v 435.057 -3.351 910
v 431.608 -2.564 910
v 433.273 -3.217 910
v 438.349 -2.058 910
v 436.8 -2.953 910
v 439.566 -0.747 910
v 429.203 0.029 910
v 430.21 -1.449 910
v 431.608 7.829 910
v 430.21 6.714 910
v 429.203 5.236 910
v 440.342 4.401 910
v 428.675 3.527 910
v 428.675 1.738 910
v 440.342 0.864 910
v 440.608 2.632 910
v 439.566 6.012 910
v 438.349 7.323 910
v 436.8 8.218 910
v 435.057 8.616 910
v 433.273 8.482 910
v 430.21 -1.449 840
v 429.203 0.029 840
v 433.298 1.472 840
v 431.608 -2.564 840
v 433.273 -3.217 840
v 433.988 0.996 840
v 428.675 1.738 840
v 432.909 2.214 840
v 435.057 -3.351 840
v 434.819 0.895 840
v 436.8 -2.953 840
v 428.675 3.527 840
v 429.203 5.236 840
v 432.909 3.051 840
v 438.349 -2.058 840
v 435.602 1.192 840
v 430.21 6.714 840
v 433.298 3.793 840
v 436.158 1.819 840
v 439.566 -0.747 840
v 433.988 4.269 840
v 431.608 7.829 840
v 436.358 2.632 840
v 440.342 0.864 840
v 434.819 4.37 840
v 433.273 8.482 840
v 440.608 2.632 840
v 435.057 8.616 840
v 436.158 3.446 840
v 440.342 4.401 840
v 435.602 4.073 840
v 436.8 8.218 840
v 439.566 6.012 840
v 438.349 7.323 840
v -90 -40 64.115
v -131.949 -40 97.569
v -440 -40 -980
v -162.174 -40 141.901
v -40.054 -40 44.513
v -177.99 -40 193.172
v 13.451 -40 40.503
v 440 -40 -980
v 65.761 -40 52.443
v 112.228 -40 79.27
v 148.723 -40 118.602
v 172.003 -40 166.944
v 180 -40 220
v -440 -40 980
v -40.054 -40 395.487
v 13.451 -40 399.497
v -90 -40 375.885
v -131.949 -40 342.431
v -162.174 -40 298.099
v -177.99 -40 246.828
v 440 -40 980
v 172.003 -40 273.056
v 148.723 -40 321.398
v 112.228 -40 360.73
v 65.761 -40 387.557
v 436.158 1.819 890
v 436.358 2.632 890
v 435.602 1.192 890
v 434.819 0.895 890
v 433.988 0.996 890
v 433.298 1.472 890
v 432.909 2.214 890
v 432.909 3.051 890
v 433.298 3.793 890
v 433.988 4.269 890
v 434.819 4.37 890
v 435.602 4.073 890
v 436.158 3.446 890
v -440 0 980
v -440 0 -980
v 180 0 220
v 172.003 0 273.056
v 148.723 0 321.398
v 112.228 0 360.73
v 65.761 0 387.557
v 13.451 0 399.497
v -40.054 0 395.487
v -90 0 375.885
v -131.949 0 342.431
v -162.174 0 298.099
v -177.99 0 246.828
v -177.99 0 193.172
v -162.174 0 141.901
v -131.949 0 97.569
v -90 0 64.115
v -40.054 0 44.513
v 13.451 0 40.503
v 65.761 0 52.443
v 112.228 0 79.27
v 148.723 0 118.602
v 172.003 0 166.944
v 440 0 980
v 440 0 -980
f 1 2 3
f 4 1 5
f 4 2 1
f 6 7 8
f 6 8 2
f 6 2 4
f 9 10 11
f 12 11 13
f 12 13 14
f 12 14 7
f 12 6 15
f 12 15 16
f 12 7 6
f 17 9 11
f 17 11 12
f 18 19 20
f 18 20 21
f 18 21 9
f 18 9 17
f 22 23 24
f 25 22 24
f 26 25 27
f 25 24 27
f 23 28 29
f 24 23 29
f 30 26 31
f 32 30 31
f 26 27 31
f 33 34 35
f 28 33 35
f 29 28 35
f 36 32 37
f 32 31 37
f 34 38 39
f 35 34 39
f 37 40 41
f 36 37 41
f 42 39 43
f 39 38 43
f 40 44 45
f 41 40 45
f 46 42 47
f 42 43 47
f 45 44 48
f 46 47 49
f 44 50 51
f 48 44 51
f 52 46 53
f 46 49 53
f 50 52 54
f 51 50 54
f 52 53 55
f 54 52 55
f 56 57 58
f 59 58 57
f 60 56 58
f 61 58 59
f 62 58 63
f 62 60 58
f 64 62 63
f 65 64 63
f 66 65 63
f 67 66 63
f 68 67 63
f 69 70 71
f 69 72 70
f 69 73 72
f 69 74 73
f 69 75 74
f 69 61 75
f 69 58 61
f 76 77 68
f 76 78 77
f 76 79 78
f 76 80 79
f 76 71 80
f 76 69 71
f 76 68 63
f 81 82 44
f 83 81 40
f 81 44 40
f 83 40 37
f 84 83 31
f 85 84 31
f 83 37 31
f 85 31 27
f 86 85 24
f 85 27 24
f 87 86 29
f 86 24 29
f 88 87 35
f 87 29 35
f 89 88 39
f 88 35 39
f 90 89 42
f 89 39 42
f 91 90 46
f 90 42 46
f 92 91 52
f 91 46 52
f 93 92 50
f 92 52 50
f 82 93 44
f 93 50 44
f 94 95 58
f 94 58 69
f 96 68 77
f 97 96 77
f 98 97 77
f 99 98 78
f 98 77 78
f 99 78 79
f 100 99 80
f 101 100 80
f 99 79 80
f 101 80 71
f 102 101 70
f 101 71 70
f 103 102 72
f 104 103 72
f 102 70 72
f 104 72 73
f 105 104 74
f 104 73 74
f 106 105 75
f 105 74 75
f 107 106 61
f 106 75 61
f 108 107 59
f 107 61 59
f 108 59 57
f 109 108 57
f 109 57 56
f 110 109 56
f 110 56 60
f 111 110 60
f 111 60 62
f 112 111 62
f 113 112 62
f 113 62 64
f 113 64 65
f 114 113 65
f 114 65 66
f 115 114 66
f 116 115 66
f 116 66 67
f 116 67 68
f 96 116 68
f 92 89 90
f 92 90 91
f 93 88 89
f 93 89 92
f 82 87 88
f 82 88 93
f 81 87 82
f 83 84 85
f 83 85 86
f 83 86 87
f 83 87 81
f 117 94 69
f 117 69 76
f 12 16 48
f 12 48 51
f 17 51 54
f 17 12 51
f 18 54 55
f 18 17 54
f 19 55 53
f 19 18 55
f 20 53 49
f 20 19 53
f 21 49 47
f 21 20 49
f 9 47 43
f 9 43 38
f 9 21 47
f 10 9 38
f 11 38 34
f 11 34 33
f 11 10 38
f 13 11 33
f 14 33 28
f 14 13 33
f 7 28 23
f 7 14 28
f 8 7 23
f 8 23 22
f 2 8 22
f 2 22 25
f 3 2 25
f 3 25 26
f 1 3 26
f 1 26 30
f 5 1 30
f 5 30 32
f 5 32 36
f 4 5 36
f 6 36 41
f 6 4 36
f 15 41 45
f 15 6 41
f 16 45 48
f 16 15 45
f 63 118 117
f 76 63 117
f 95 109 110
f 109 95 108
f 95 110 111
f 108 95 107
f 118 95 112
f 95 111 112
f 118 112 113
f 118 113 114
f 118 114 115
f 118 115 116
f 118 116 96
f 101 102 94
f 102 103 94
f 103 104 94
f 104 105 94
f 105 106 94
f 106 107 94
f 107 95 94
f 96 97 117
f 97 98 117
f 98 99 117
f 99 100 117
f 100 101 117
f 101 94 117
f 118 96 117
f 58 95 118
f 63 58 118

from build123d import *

# Parameters (mm, degrees)
F0_W     = 880
F0_H     = 1960
F1_DEPTH = 40
F2_R     = 180
F3_DEPTH = 116.84
F5_R     = 6
F6_DEPTH = 70
F7_R     = 1.75
F8_DEPTH = 50


with BuildPart() as f1:
    # F0 (on Front) → F1 (new body)
    with BuildSketch(Plane.XZ):
        Rectangle(F0_W, F0_H)
    extrude(amount=F1_DEPTH)

    # F2 (on face) → F3 (cut)
    with BuildSketch(Plane.XZ.offset(40)):
        with Locations((0, 220)):
            Circle(F2_R)
    extrude(amount=-F3_DEPTH, mode=Mode.SUBTRACT)


with BuildPart() as f6:
    # F5 (on offset) → F6 (new body)
    with BuildSketch(Plane.XY.offset(910)):
        with Locations((434.6083445217, 2.6324990415)):
            Circle(F5_R)
    extrude(amount=-F6_DEPTH)

    # F7 (on face) → F8 (cut)
    with BuildSketch(Plane(origin=(0, 0, 840), x_dir=(1, 0, 0), z_dir=(0, 0, -1))):
        with Locations((434.6083445217, -2.6324990415)):
            Circle(F7_R)
    extrude(amount=-F8_DEPTH, mode=Mode.SUBTRACT)


solid = Compound([f1.part, f6.part])
